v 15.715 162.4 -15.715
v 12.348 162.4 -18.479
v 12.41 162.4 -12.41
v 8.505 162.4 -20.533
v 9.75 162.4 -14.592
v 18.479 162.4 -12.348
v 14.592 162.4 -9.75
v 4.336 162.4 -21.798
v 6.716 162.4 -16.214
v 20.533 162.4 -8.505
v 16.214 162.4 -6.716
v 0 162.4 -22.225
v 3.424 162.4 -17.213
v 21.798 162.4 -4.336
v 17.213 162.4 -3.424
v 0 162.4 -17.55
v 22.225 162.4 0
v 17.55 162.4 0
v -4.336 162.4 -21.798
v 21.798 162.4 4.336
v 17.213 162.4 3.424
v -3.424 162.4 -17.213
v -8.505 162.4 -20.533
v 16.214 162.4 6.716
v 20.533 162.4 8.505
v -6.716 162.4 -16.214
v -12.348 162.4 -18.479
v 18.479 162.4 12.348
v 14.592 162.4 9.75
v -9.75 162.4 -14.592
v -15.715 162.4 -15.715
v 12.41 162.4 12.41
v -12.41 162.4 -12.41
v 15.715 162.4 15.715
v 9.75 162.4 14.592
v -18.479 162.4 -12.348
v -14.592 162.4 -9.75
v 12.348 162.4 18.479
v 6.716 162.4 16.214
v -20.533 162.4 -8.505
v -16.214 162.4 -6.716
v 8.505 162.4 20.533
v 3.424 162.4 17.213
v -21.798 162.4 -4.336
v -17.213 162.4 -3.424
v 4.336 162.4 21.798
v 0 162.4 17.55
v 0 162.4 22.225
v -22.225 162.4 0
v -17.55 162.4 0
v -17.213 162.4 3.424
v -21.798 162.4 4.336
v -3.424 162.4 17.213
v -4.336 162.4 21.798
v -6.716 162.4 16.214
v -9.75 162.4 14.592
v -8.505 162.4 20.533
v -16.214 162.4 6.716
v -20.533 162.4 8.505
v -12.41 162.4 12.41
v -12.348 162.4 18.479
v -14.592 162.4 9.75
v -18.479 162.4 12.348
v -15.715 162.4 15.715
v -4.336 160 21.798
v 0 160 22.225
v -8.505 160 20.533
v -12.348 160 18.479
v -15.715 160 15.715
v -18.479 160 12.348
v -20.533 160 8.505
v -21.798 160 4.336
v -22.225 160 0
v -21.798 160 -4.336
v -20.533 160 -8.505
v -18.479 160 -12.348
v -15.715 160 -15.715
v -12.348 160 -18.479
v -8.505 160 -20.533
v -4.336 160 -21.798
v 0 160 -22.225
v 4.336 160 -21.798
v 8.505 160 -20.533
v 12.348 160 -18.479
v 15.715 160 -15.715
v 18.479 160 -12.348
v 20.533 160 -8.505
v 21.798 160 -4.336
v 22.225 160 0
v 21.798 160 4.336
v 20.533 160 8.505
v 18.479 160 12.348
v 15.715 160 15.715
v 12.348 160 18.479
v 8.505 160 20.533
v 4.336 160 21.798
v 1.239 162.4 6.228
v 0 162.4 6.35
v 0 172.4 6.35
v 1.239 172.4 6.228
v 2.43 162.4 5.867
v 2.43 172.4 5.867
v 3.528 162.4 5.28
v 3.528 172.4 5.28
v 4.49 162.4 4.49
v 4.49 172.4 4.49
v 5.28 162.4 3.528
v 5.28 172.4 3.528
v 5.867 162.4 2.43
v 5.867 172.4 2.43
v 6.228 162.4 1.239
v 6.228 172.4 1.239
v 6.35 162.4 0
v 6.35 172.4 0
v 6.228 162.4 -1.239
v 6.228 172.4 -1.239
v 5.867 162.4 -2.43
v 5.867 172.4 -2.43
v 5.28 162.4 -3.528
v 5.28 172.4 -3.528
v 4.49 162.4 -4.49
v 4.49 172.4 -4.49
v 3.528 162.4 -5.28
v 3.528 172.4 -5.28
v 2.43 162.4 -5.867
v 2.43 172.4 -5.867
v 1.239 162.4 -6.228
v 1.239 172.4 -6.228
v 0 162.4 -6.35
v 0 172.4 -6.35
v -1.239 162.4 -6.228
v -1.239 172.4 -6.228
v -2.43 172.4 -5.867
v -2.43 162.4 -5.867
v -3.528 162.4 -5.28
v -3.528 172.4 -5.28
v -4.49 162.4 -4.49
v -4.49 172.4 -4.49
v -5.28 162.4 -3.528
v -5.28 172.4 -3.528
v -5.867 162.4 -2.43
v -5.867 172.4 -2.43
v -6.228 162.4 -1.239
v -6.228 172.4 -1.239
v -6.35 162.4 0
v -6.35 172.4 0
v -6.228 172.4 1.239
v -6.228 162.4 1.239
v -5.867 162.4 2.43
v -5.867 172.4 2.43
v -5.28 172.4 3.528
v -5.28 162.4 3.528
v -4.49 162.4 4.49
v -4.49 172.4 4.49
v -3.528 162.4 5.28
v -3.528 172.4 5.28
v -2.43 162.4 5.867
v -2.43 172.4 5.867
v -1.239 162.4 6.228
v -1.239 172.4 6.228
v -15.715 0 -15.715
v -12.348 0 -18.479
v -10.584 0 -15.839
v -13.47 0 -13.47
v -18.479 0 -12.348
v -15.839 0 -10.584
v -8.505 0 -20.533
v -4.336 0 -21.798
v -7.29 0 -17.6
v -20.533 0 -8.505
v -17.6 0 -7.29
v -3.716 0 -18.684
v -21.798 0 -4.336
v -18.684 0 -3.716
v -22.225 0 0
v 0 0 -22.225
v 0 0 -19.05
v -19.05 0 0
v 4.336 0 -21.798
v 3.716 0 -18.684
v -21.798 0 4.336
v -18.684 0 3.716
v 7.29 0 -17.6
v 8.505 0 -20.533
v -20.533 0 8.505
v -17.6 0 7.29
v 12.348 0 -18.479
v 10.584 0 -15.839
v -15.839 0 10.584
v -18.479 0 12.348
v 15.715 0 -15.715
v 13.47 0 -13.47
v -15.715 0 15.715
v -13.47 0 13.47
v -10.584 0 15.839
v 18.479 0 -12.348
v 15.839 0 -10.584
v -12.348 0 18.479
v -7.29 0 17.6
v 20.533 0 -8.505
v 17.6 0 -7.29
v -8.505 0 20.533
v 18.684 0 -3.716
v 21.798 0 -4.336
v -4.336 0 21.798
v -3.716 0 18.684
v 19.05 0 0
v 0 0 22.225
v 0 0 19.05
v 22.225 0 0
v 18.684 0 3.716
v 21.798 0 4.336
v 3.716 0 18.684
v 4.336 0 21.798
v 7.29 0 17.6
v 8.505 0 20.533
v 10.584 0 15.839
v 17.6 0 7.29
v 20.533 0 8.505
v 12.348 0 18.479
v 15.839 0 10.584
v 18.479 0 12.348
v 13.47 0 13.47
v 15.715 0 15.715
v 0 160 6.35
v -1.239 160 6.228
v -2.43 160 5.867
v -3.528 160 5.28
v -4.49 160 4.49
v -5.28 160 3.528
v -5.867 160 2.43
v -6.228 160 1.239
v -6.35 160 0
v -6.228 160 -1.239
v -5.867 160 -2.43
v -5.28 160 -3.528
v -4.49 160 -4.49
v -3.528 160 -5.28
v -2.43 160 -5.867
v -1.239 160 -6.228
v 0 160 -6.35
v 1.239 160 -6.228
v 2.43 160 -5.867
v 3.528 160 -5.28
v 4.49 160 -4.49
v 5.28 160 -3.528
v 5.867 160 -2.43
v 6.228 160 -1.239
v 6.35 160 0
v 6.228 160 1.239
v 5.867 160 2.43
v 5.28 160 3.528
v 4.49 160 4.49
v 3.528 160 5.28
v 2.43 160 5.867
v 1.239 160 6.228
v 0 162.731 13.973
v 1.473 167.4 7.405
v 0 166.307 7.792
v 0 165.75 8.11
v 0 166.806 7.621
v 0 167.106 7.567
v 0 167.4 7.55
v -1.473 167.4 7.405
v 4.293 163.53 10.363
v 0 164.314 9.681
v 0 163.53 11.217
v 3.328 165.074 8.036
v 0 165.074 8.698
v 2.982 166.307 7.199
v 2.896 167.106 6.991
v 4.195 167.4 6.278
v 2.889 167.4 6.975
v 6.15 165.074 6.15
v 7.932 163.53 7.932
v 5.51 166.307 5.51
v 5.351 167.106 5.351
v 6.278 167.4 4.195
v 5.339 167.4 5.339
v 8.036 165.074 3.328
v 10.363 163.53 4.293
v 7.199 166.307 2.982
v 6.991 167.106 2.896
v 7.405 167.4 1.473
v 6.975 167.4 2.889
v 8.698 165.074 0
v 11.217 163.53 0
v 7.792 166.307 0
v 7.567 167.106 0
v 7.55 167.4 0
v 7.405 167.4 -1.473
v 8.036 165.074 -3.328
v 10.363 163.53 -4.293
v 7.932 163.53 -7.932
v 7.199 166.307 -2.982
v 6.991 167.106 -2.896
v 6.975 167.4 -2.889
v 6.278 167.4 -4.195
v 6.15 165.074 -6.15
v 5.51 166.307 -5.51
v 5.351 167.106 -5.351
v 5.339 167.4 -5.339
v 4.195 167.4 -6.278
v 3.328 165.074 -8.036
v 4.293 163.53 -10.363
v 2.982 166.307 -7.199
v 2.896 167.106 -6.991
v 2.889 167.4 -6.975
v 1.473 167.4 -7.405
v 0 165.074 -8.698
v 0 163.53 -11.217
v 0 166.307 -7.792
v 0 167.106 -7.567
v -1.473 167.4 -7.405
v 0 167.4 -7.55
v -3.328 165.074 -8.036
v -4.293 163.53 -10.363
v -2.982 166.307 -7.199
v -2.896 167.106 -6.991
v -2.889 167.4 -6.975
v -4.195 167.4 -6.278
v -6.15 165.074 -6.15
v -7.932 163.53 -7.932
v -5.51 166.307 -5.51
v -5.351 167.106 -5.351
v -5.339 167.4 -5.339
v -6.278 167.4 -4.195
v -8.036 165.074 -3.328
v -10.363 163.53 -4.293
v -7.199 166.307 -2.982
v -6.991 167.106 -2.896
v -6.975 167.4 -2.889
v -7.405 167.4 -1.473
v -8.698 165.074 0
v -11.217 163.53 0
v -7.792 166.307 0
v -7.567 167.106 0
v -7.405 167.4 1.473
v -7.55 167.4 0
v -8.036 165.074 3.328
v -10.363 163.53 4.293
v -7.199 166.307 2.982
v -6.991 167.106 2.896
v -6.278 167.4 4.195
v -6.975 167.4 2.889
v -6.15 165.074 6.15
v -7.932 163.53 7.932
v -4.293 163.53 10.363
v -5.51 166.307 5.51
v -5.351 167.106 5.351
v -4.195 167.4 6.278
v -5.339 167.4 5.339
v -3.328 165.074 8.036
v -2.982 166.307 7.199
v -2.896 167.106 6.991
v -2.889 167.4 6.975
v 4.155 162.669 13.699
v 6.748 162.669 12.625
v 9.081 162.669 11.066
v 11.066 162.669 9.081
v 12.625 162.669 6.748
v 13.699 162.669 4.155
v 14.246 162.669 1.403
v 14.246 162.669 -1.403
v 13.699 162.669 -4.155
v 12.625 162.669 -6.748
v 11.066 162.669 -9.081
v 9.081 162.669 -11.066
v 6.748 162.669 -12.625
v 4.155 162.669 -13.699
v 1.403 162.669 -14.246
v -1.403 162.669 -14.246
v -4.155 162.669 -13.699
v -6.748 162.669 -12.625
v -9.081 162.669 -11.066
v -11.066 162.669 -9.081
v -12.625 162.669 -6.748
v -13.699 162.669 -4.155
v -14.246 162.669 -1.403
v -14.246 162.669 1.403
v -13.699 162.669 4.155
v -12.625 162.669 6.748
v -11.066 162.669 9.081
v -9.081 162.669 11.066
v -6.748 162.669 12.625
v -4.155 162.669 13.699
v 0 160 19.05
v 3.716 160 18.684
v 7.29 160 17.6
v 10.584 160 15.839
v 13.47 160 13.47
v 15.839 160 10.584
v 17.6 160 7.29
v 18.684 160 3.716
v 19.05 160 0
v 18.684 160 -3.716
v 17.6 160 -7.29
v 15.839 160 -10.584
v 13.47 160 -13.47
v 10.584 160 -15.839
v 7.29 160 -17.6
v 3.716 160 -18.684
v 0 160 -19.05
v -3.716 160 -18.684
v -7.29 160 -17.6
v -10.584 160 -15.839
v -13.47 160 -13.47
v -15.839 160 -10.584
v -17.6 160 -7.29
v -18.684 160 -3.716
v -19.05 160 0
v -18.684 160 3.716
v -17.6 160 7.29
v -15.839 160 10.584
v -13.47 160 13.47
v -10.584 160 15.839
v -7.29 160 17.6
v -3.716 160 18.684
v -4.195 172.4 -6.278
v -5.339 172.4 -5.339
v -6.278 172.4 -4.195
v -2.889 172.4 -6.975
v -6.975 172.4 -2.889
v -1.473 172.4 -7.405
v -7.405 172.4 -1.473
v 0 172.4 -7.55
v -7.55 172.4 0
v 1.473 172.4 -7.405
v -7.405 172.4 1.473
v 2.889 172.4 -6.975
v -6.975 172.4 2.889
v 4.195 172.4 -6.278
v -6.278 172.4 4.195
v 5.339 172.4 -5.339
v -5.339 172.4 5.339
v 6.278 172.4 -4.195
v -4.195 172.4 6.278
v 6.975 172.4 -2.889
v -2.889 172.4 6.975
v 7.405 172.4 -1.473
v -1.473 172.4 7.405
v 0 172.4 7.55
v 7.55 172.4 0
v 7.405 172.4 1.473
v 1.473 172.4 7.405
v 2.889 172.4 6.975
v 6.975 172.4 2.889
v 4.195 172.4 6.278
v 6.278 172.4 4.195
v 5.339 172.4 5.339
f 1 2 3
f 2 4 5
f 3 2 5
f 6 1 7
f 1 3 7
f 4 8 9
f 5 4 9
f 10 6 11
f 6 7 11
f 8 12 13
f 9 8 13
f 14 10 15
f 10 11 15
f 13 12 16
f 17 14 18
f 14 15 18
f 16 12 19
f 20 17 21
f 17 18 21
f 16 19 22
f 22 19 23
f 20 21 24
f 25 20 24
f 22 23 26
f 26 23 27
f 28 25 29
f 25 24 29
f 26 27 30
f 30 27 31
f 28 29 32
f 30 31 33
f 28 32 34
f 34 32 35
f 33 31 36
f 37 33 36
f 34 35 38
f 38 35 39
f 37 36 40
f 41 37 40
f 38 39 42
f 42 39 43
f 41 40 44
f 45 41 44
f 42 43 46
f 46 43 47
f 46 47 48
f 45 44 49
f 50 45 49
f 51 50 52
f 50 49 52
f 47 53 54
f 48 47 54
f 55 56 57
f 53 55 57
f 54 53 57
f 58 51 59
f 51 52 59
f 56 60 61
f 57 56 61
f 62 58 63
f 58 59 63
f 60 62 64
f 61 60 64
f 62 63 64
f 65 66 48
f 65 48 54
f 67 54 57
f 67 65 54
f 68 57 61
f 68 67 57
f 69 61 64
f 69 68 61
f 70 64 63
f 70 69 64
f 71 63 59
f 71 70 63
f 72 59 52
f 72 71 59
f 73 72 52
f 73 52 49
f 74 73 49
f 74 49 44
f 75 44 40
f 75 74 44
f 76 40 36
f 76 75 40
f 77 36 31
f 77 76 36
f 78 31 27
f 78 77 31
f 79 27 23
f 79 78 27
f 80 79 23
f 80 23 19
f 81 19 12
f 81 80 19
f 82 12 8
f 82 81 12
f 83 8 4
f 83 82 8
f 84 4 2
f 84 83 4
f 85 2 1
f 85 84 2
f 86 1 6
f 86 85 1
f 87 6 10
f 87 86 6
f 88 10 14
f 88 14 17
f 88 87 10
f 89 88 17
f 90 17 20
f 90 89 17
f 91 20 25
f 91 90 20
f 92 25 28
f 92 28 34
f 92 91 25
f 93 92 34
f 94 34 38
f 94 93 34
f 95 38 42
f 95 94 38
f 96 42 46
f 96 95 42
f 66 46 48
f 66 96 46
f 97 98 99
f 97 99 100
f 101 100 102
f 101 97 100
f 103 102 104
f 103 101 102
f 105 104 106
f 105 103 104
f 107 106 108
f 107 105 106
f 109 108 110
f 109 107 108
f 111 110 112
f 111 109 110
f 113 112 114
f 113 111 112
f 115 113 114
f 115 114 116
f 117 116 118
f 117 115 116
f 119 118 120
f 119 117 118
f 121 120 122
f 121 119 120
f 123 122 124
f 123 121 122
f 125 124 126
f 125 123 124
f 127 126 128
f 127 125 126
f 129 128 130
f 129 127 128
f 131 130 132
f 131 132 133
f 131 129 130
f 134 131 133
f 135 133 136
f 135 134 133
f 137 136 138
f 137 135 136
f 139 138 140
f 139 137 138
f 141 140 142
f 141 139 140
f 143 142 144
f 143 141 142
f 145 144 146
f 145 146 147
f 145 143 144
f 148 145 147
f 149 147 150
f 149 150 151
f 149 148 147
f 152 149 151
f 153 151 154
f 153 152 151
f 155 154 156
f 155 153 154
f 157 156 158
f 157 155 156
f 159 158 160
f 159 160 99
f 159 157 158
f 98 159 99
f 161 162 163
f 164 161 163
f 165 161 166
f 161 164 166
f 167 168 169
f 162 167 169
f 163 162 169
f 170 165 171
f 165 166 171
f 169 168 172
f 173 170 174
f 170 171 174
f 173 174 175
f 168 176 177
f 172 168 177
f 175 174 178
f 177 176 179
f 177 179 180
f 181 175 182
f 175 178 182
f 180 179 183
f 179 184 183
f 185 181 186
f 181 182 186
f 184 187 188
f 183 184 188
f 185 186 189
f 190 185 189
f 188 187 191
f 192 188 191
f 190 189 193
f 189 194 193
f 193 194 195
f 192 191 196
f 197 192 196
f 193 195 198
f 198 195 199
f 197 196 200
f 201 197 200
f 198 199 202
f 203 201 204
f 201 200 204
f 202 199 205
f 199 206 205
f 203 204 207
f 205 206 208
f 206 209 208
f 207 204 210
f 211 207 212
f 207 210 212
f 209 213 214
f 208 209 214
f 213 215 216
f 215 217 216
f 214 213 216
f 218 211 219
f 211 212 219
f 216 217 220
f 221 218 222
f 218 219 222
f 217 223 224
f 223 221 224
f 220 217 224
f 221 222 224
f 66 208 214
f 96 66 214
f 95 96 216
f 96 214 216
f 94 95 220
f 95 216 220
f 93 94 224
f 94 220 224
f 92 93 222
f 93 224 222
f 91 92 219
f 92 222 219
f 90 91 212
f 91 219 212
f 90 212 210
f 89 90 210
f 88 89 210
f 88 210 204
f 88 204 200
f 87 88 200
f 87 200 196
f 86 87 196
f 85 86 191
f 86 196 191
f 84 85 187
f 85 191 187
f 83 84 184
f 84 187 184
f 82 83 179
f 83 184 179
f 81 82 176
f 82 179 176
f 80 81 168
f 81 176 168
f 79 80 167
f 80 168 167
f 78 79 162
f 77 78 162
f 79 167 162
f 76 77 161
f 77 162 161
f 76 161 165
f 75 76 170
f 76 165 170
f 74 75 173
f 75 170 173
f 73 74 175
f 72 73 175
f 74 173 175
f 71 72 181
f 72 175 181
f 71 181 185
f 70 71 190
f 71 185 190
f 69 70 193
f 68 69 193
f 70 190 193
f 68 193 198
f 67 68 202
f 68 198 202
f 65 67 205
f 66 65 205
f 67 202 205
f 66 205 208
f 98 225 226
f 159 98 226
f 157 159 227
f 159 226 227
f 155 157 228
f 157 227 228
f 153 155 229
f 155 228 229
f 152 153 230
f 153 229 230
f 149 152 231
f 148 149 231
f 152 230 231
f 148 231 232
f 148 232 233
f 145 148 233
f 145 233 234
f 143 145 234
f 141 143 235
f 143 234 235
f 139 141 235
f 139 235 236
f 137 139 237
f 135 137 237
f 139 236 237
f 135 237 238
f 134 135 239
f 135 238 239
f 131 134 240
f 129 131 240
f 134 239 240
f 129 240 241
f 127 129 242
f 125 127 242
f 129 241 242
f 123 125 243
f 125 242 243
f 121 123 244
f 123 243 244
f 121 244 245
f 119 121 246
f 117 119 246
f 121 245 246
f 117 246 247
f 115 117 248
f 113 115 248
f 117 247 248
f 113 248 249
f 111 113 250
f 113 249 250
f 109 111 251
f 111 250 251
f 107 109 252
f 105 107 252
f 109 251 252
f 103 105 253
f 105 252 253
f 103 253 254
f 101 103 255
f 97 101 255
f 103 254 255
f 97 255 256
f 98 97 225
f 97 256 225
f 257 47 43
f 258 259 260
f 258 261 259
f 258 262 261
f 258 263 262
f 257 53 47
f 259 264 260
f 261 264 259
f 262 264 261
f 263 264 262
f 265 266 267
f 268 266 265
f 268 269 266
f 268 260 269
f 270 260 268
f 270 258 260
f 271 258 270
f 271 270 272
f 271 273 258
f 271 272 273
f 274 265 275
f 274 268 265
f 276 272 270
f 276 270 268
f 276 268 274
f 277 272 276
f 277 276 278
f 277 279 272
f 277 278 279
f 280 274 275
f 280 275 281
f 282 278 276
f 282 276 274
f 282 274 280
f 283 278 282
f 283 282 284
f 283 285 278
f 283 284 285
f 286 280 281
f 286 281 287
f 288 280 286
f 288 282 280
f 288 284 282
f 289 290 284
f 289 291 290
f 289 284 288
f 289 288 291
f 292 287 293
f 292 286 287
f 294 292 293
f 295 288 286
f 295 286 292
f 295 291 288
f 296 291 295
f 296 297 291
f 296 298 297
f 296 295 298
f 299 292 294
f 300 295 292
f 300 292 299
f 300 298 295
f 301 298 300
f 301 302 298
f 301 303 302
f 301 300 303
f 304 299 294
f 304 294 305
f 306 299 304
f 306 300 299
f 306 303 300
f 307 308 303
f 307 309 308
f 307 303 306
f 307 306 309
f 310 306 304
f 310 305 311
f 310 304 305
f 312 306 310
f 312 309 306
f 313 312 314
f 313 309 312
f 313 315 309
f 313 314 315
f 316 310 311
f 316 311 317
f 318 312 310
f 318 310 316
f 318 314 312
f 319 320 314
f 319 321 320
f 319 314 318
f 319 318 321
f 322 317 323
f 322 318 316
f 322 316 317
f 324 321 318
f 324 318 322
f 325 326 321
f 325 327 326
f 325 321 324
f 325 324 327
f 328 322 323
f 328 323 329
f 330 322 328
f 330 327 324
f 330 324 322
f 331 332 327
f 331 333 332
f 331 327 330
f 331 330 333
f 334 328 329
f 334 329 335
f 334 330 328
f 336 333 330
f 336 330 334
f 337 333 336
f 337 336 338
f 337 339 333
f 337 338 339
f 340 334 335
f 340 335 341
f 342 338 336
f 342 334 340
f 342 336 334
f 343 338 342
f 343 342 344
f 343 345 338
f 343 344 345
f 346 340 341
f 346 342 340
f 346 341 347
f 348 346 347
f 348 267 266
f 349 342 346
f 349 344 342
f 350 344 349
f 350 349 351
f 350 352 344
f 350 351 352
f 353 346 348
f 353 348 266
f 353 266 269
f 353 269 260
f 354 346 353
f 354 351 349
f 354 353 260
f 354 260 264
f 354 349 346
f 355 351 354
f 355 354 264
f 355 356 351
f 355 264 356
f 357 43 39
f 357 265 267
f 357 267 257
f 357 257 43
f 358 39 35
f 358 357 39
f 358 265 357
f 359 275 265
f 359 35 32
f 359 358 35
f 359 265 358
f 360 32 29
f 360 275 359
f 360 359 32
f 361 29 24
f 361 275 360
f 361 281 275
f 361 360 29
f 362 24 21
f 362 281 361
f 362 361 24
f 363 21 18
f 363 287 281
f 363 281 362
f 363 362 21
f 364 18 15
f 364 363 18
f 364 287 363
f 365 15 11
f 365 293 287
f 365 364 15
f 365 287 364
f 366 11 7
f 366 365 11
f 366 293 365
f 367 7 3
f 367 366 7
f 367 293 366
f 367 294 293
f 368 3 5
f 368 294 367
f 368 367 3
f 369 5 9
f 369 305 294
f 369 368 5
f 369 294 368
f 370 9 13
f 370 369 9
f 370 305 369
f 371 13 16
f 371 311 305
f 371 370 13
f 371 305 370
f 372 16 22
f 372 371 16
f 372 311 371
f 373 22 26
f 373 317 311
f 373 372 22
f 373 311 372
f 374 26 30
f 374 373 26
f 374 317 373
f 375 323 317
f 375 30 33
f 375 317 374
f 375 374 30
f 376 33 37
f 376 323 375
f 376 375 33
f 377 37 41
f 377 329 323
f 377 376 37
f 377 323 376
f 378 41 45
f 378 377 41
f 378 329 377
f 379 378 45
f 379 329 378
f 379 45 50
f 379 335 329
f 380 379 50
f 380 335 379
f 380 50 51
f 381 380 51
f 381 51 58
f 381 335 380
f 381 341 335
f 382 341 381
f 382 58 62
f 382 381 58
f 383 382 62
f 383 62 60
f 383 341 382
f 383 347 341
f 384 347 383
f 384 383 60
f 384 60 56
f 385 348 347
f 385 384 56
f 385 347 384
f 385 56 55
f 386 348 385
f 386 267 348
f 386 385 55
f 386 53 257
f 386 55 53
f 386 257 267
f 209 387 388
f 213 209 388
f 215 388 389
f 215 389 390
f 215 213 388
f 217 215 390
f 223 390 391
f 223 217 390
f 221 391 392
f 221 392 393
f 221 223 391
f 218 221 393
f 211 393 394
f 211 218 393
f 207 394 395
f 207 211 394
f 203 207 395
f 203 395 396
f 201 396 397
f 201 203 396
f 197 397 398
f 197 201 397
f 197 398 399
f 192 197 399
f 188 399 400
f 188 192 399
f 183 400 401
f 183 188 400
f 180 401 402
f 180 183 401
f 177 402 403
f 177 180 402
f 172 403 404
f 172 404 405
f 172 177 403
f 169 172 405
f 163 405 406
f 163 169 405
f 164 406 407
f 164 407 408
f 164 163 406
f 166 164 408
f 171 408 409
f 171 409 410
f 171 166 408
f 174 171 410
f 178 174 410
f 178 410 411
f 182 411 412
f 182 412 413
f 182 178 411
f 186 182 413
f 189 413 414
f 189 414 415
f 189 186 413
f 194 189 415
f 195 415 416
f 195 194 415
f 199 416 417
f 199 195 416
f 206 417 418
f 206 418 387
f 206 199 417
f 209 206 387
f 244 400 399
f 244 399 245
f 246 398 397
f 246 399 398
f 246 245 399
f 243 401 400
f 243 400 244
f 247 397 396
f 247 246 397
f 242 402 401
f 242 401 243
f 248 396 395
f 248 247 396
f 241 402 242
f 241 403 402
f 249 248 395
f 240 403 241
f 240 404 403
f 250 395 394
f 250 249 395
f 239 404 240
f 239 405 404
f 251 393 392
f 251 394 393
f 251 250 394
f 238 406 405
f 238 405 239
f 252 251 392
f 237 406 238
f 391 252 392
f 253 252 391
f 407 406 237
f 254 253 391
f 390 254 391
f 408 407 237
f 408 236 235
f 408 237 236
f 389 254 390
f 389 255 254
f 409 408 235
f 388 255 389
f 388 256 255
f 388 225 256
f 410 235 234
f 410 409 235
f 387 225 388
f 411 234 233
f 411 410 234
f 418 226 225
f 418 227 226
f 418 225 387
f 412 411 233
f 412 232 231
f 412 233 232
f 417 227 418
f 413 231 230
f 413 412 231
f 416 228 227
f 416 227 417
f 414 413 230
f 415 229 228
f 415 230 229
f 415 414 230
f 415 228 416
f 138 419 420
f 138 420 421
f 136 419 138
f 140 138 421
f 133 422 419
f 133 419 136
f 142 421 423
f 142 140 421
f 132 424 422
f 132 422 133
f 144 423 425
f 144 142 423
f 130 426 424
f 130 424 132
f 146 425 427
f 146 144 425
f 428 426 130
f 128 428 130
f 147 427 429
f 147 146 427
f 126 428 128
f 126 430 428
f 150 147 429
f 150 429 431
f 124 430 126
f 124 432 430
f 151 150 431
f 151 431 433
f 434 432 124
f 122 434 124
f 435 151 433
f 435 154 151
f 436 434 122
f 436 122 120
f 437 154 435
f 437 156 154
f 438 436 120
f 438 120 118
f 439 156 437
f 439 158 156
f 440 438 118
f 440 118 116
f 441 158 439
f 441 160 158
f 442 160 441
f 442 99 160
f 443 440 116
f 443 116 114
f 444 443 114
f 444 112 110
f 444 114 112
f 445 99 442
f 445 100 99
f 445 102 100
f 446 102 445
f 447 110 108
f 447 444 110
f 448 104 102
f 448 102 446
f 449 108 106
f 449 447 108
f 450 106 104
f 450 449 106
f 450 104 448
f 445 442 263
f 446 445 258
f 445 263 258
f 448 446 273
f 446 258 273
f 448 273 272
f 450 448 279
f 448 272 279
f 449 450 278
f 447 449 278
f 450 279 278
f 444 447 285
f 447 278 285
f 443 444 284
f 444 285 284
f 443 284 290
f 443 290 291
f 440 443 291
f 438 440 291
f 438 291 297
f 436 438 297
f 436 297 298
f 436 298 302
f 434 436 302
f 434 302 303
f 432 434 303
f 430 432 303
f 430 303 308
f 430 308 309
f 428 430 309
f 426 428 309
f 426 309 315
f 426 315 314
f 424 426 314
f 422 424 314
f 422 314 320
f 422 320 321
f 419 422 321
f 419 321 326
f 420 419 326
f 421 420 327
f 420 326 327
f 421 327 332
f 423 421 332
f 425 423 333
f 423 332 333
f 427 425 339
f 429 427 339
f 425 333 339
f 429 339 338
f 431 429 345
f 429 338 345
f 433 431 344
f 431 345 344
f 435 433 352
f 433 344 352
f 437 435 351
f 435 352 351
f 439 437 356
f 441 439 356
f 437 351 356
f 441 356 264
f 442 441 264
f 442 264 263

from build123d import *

# Parameters (mm, degrees)
SKETCH1_R           = 22.225
SKETCH1_R_2         = 19.05
BOSS_EXTRUDE1_DEPTH = 160
BOSS_EXTRUDE2_START = -160
SKETCH3_R           = 22.225
SKETCH3_R_2         = 6.35
BOSS_EXTRUDE2_DEPTH = 2.4
SKETCH4_R           = 7.55
SKETCH4_R_2         = 6.35
BOSS_EXTRUDE3_DEPTH = 10
FILLET1_SIZE        = 10
FILLET1_SIZE_2      = 5


with BuildPart() as part:
    # Sketch1 → Boss-Extrude1 (new body)
    with BuildSketch(Plane(origin=(0, 0, 0), x_dir=(1, 0, 0), z_dir=(0, 1, 0))):
        with Locations(Location((0, 0, 0), (0, 0, 270))):
            Circle(SKETCH1_R)
        with Locations(Location((0, 0, 0), (0, 0, 270))):
            Circle(SKETCH1_R_2, mode=Mode.SUBTRACT)
    extrude(amount=BOSS_EXTRUDE1_DEPTH)

    # Sketch3 → Boss-Extrude2 (add)
    with BuildSketch(Plane.XZ.offset(BOSS_EXTRUDE2_START)):
        with Locations(Location((0, 0, 0), (0, 0, 90))):
            Circle(SKETCH3_R)
        with Locations(Location((0, 0, 0), (0, 0, 90))):
            Circle(SKETCH3_R_2, mode=Mode.SUBTRACT)
    extrude(amount=-BOSS_EXTRUDE2_DEPTH)

    # Sketch4 → Boss-Extrude3 (add)
    with BuildSketch(Plane(origin=(0, 162.4, 0), x_dir=(-1, 0, 0), z_dir=(0, 1, 0))):
        with Locations(Location((0, 0, 0), (0, 0, 90))):
            Circle(SKETCH4_R)
        with Locations(Location((0, 0, 0), (0, 0, 90))):
            Circle(SKETCH4_R_2, mode=Mode.SUBTRACT)
    extrude(amount=BOSS_EXTRUDE3_DEPTH)

    # Fillet1
    # an asymmetric fillet: 10, 5 mm, written as the material it adds along each edge
    with BuildSketch(Plane(origin=(0, 162.4, 0), x_dir=(0, 0, 1), z_dir=(-1, 0, 0))) as fillet1_piece_1:
        with BuildLine():
            Bezier((7.55 + FILLET1_SIZE, 0), (7.55, 0), (7.55, FILLET1_SIZE_2), weights=[1, 0.707106781, 1])
            Line((7.55, FILLET1_SIZE_2), (7.55, 0))
            Line((7.55, 0), (7.55 + FILLET1_SIZE, 0))
        make_face()
    revolve(axis=Axis((0, 162.4, 0), (0, 1, 0)))


solid = part.part
